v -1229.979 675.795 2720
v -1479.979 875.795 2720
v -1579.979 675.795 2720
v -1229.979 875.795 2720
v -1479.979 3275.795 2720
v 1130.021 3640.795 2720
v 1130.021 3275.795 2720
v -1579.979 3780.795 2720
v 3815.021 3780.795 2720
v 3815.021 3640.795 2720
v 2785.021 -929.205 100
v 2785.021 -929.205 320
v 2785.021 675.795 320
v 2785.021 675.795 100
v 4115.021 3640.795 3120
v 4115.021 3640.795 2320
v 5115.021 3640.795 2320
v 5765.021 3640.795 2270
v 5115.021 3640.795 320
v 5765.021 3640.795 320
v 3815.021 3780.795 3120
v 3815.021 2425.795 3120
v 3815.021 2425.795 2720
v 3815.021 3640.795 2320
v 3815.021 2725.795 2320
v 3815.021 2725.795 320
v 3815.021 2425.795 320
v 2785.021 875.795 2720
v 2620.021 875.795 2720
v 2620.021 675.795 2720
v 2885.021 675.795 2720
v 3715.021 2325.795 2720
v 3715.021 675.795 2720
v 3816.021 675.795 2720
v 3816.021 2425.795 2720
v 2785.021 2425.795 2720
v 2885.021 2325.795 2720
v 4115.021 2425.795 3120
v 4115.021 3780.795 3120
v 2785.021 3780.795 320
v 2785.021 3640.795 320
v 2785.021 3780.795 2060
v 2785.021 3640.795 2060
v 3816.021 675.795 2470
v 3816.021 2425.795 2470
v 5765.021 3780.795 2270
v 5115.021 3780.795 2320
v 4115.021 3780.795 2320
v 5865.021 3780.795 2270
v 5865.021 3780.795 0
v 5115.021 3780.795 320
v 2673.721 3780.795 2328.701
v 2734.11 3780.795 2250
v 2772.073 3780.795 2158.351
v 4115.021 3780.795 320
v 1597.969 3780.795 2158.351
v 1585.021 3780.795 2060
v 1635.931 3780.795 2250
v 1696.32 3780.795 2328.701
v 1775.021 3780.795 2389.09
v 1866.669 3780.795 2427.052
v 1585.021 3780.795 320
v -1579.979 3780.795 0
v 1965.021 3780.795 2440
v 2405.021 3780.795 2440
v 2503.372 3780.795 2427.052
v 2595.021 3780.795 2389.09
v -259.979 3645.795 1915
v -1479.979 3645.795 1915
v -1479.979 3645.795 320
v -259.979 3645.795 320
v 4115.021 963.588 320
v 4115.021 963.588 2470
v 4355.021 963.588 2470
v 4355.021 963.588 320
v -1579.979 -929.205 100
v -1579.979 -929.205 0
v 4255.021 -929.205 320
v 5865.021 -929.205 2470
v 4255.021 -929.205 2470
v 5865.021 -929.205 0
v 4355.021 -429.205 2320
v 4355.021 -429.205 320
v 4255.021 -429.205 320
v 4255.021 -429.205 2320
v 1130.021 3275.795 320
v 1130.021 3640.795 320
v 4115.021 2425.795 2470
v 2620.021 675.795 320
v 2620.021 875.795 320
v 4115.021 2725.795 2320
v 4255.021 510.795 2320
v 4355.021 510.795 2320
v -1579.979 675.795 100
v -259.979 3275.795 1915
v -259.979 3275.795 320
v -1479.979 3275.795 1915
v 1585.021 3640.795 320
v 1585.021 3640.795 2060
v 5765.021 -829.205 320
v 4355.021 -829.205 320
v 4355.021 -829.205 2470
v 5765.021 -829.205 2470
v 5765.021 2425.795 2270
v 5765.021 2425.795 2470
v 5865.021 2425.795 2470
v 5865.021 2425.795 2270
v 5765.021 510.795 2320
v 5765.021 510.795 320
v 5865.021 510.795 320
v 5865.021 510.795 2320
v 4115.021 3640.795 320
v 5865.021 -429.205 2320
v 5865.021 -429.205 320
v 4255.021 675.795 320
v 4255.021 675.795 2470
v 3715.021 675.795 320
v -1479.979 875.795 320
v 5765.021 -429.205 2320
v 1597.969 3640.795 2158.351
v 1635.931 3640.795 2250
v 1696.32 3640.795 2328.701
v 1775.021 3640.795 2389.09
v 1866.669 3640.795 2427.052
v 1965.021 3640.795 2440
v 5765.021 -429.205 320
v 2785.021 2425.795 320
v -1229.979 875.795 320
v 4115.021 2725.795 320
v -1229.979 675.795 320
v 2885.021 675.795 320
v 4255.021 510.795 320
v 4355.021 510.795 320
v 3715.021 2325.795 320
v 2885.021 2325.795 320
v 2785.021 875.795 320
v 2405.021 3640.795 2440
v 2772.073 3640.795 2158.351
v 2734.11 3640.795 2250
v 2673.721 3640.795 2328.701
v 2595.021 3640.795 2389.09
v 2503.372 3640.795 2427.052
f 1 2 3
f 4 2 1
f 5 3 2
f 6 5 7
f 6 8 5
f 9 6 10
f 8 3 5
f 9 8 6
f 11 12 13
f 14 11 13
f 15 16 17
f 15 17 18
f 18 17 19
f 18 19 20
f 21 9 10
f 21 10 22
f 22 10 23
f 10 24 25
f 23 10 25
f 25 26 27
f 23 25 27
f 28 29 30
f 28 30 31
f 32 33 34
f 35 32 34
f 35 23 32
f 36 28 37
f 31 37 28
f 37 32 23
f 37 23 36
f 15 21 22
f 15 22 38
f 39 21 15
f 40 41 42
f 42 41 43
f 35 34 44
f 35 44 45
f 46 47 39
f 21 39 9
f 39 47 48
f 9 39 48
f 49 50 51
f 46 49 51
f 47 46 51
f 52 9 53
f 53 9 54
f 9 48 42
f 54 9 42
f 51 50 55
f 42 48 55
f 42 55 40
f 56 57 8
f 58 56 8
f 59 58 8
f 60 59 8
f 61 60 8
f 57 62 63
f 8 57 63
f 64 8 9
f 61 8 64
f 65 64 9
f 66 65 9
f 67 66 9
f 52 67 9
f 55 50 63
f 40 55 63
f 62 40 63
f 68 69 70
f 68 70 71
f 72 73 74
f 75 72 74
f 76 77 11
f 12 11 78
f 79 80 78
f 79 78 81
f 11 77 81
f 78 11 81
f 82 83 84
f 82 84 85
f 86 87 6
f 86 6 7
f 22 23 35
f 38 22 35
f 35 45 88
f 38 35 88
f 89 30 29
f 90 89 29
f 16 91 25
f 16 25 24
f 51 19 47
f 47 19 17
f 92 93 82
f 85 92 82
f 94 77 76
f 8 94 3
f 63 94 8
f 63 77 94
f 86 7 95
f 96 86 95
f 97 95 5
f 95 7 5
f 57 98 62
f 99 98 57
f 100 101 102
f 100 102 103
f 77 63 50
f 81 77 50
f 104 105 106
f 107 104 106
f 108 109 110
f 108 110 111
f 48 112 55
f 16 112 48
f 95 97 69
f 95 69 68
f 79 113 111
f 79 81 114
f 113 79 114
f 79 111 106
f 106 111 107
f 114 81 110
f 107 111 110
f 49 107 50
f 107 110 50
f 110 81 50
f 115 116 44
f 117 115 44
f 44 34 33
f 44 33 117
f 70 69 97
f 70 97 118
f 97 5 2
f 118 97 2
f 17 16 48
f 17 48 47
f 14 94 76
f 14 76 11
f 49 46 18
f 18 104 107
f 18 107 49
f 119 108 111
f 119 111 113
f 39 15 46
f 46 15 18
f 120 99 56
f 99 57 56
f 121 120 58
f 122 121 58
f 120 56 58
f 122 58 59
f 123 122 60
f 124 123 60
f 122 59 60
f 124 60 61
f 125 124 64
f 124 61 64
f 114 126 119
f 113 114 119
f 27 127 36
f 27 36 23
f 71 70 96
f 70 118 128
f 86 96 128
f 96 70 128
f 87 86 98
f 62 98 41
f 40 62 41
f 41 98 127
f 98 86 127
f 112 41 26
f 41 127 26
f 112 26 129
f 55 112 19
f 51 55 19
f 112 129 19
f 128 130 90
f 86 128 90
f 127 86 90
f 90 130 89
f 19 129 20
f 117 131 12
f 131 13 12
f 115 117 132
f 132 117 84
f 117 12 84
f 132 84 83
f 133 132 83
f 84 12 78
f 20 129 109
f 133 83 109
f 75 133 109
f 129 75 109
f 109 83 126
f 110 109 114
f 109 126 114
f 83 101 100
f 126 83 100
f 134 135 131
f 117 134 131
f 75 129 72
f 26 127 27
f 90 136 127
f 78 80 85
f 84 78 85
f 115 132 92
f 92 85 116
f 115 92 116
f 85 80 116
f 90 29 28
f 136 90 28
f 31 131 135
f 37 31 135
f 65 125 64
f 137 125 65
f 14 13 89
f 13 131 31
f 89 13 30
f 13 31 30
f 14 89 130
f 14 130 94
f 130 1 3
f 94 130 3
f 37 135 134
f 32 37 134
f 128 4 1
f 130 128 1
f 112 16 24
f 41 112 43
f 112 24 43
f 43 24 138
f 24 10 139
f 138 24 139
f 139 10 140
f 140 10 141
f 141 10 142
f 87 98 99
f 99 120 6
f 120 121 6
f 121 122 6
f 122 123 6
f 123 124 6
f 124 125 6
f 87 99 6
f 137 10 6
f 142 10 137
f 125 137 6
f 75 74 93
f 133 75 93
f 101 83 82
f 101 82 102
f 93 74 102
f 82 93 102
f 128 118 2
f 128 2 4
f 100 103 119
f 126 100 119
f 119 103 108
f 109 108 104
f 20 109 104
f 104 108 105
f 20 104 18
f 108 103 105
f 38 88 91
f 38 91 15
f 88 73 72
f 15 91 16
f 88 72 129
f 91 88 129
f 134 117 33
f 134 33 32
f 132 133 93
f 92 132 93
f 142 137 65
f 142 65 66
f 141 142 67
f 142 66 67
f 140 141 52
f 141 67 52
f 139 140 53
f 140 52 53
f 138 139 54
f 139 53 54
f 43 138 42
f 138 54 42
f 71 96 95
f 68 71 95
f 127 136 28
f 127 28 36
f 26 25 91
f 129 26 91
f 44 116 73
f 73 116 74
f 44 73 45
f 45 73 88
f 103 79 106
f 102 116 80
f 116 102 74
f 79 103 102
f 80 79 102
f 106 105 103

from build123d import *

# Parameters (mm, degrees)
F0_W      = 7445
F0_H      = 4710
F1_DEPTH  = 2720
F3_DEPTH  = 2400
F4_W      = 1220
F4_H      = 1595
F5_DEPTH  = 370
F6_W      = 1200
F6_H      = 2120
F6_W_2    = 1000
F6_H_2    = 2000
F7_DEPTH  = 140
F8_R      = 380
F9_W      = 830
F9_H      = 1650
F10_DEPTH = 2400
F11_W     = 940
F11_H     = 2000
F12_DEPTH = 100
F13_DEPTH = 1510
F14_W     = 915
F14_H     = 400
F15_DEPTH = 300
F17_DEPTH = 400
F18_W     = 3355
F18_H     = 250
F19_DEPTH = 2049
F21_DEPTH = 1355
F22_W     = 4365
F22_H     = 1605
F23_DEPTH = 220


with BuildPart() as f1:
    # F0 (on Top) → F1 (new body)
    with BuildSketch(Plane.XY):
        with Locations((2142.52072, 1425.795413)):
            Rectangle(F0_W, F0_H)
    extrude(amount=F1_DEPTH)

    # F2 (on face) → F3 (cut)
    with BuildSketch(Plane.XY.offset(2720)):
        Polygon((1130.02072, 3275.795413), (-1479.97928, 3275.795413), (-1479.97928, 875.795413), (-1229.97928, 875.795413), (-1229.97928, 675.795413), (2620.02072, 675.795413), (2620.02072, 875.795413), (2785.02072, 875.795413), (2785.02072, 2425.795413), (3815.02072, 2425.795413), (3815.02072, 2725.795413), (4115.02072, 2725.795413), (4115.02072, 963.588339), (4355.02072, 963.588339), (4355.02072, -829.204587), (5765.02072, -829.204587), (5765.02072, -429.204587), (5765.02072, 510.795413), (5765.02072, 3640.795413), (5115.02072, 3640.795413), (4115.02072, 3640.795413), (2785.02072, 3640.795413), (1585.02072, 3640.795413), (1130.02072, 3640.795413), align=None)
    extrude(amount=-F3_DEPTH, mode=Mode.SUBTRACT)

    # F4 (on face) → F5 (cut)
    with BuildSketch(Plane.XZ.offset(-3275.795413)):
        with Locations((-869.97928, 1117.5)):
            Rectangle(F4_W, F4_H)
    extrude(amount=-F5_DEPTH, mode=Mode.SUBTRACT)

    # F6 (on face) → F7 (cut, through all)
    with BuildSketch(Plane.XZ.offset(-3640.795413)):
        with Locations((2185.02072, 1380)):
            Rectangle(F6_W, F6_H)
        with Locations((4615.02072, 1320)):
            Rectangle(F6_W_2, F6_H_2)
    extrude(amount=-F7_DEPTH, mode=Mode.SUBTRACT)

    # F8
    f8_edges = [f1.edges().sort_by_distance(p)[0] for p in [
        (1585.02072, 3710.795413, 2440),
        (2785.02072, 3710.795413, 2440),
    ]]
    fillet(f8_edges, radius=F8_R)

    # F9 (on face) → F10 (cut)
    with BuildSketch(Plane.XY.offset(2720)):
        Polygon((2620.02072, 675.795413), (-1229.97928, 675.795413), (-1579.97928, 675.795413), (-1579.97928, -929.204587), (4255.02072, -929.204587), (4255.02072, 675.795413), (3715.02072, 675.795413), (2885.02072, 675.795413), align=None)
        with Locations((3300.02072, 1500.795413)):
            Rectangle(F9_W, F9_H)
    extrude(amount=-F10_DEPTH, mode=Mode.SUBTRACT)

    # F11 (on face) → F12 (cut, through all)
    with BuildSketch(Plane(origin=(5765.02072, 0, 0), x_dir=(0, -1, 0), z_dir=(-1, 0, 0))):
        with Locations((-40.795413, 1320)):
            Rectangle(F11_W, F11_H)
    extrude(amount=-F12_DEPTH, mode=Mode.SUBTRACT)

    # F11 (on face) → F13 (cut, through all)
    with BuildSketch(Plane(origin=(5765.02072, 0, 0), x_dir=(0, -1, 0), z_dir=(-1, 0, 0))):
        with Locations((-40.795413, 1320)):
            Rectangle(F11_W, F11_H)
    extrude(amount=F13_DEPTH, mode=Mode.SUBTRACT)

    # F14 (on face) → F15 (join, through all)
    with BuildSketch(Plane.YZ.offset(4115.02072)):
        with Locations((3183.295413, 2520)):
            Rectangle(F14_W, F14_H)
    extrude(amount=-F15_DEPTH)

    # F16 (on face) → F17 (join)
    with BuildSketch(Plane.XY.offset(2720)):
        Polygon((3815.02072, 2425.795413), (4115.02072, 2425.795413), (4115.02072, 3640.795413), (5765.02072, 3640.795413), (5765.02072, 2425.795413), (5865.02072, 2425.795413), (5865.02072, 3640.795413), (5865.02072, 3780.795413), (3815.02072, 3780.795413), (3815.02072, 3640.795413), align=None)
    extrude(amount=F17_DEPTH)

    # F18 (on face) → F19 (cut)
    with BuildSketch(Plane.YZ.offset(5865.02072)):
        with Locations((748.295413, 2595)):
            Rectangle(F18_W, F18_H)
    extrude(amount=-F19_DEPTH, mode=Mode.SUBTRACT)

    # F20 (on face) → F21 (cut, through all)
    with BuildSketch(Plane.XZ.offset(-2425.795413)):
        Polygon((5865.02072, 3120), (4115.02072, 3120), (5765.02072, 2270), (5865.02072, 2270), align=None)
    extrude(amount=-F21_DEPTH, mode=Mode.SUBTRACT)

    # F22 (on face) → F23 (cut)
    with BuildSketch(Plane.XY.offset(320)):
        with Locations((602.52072, -126.704587)):
            Rectangle(F22_W, F22_H)
    extrude(amount=-F23_DEPTH, mode=Mode.SUBTRACT)


solid = f1.part
